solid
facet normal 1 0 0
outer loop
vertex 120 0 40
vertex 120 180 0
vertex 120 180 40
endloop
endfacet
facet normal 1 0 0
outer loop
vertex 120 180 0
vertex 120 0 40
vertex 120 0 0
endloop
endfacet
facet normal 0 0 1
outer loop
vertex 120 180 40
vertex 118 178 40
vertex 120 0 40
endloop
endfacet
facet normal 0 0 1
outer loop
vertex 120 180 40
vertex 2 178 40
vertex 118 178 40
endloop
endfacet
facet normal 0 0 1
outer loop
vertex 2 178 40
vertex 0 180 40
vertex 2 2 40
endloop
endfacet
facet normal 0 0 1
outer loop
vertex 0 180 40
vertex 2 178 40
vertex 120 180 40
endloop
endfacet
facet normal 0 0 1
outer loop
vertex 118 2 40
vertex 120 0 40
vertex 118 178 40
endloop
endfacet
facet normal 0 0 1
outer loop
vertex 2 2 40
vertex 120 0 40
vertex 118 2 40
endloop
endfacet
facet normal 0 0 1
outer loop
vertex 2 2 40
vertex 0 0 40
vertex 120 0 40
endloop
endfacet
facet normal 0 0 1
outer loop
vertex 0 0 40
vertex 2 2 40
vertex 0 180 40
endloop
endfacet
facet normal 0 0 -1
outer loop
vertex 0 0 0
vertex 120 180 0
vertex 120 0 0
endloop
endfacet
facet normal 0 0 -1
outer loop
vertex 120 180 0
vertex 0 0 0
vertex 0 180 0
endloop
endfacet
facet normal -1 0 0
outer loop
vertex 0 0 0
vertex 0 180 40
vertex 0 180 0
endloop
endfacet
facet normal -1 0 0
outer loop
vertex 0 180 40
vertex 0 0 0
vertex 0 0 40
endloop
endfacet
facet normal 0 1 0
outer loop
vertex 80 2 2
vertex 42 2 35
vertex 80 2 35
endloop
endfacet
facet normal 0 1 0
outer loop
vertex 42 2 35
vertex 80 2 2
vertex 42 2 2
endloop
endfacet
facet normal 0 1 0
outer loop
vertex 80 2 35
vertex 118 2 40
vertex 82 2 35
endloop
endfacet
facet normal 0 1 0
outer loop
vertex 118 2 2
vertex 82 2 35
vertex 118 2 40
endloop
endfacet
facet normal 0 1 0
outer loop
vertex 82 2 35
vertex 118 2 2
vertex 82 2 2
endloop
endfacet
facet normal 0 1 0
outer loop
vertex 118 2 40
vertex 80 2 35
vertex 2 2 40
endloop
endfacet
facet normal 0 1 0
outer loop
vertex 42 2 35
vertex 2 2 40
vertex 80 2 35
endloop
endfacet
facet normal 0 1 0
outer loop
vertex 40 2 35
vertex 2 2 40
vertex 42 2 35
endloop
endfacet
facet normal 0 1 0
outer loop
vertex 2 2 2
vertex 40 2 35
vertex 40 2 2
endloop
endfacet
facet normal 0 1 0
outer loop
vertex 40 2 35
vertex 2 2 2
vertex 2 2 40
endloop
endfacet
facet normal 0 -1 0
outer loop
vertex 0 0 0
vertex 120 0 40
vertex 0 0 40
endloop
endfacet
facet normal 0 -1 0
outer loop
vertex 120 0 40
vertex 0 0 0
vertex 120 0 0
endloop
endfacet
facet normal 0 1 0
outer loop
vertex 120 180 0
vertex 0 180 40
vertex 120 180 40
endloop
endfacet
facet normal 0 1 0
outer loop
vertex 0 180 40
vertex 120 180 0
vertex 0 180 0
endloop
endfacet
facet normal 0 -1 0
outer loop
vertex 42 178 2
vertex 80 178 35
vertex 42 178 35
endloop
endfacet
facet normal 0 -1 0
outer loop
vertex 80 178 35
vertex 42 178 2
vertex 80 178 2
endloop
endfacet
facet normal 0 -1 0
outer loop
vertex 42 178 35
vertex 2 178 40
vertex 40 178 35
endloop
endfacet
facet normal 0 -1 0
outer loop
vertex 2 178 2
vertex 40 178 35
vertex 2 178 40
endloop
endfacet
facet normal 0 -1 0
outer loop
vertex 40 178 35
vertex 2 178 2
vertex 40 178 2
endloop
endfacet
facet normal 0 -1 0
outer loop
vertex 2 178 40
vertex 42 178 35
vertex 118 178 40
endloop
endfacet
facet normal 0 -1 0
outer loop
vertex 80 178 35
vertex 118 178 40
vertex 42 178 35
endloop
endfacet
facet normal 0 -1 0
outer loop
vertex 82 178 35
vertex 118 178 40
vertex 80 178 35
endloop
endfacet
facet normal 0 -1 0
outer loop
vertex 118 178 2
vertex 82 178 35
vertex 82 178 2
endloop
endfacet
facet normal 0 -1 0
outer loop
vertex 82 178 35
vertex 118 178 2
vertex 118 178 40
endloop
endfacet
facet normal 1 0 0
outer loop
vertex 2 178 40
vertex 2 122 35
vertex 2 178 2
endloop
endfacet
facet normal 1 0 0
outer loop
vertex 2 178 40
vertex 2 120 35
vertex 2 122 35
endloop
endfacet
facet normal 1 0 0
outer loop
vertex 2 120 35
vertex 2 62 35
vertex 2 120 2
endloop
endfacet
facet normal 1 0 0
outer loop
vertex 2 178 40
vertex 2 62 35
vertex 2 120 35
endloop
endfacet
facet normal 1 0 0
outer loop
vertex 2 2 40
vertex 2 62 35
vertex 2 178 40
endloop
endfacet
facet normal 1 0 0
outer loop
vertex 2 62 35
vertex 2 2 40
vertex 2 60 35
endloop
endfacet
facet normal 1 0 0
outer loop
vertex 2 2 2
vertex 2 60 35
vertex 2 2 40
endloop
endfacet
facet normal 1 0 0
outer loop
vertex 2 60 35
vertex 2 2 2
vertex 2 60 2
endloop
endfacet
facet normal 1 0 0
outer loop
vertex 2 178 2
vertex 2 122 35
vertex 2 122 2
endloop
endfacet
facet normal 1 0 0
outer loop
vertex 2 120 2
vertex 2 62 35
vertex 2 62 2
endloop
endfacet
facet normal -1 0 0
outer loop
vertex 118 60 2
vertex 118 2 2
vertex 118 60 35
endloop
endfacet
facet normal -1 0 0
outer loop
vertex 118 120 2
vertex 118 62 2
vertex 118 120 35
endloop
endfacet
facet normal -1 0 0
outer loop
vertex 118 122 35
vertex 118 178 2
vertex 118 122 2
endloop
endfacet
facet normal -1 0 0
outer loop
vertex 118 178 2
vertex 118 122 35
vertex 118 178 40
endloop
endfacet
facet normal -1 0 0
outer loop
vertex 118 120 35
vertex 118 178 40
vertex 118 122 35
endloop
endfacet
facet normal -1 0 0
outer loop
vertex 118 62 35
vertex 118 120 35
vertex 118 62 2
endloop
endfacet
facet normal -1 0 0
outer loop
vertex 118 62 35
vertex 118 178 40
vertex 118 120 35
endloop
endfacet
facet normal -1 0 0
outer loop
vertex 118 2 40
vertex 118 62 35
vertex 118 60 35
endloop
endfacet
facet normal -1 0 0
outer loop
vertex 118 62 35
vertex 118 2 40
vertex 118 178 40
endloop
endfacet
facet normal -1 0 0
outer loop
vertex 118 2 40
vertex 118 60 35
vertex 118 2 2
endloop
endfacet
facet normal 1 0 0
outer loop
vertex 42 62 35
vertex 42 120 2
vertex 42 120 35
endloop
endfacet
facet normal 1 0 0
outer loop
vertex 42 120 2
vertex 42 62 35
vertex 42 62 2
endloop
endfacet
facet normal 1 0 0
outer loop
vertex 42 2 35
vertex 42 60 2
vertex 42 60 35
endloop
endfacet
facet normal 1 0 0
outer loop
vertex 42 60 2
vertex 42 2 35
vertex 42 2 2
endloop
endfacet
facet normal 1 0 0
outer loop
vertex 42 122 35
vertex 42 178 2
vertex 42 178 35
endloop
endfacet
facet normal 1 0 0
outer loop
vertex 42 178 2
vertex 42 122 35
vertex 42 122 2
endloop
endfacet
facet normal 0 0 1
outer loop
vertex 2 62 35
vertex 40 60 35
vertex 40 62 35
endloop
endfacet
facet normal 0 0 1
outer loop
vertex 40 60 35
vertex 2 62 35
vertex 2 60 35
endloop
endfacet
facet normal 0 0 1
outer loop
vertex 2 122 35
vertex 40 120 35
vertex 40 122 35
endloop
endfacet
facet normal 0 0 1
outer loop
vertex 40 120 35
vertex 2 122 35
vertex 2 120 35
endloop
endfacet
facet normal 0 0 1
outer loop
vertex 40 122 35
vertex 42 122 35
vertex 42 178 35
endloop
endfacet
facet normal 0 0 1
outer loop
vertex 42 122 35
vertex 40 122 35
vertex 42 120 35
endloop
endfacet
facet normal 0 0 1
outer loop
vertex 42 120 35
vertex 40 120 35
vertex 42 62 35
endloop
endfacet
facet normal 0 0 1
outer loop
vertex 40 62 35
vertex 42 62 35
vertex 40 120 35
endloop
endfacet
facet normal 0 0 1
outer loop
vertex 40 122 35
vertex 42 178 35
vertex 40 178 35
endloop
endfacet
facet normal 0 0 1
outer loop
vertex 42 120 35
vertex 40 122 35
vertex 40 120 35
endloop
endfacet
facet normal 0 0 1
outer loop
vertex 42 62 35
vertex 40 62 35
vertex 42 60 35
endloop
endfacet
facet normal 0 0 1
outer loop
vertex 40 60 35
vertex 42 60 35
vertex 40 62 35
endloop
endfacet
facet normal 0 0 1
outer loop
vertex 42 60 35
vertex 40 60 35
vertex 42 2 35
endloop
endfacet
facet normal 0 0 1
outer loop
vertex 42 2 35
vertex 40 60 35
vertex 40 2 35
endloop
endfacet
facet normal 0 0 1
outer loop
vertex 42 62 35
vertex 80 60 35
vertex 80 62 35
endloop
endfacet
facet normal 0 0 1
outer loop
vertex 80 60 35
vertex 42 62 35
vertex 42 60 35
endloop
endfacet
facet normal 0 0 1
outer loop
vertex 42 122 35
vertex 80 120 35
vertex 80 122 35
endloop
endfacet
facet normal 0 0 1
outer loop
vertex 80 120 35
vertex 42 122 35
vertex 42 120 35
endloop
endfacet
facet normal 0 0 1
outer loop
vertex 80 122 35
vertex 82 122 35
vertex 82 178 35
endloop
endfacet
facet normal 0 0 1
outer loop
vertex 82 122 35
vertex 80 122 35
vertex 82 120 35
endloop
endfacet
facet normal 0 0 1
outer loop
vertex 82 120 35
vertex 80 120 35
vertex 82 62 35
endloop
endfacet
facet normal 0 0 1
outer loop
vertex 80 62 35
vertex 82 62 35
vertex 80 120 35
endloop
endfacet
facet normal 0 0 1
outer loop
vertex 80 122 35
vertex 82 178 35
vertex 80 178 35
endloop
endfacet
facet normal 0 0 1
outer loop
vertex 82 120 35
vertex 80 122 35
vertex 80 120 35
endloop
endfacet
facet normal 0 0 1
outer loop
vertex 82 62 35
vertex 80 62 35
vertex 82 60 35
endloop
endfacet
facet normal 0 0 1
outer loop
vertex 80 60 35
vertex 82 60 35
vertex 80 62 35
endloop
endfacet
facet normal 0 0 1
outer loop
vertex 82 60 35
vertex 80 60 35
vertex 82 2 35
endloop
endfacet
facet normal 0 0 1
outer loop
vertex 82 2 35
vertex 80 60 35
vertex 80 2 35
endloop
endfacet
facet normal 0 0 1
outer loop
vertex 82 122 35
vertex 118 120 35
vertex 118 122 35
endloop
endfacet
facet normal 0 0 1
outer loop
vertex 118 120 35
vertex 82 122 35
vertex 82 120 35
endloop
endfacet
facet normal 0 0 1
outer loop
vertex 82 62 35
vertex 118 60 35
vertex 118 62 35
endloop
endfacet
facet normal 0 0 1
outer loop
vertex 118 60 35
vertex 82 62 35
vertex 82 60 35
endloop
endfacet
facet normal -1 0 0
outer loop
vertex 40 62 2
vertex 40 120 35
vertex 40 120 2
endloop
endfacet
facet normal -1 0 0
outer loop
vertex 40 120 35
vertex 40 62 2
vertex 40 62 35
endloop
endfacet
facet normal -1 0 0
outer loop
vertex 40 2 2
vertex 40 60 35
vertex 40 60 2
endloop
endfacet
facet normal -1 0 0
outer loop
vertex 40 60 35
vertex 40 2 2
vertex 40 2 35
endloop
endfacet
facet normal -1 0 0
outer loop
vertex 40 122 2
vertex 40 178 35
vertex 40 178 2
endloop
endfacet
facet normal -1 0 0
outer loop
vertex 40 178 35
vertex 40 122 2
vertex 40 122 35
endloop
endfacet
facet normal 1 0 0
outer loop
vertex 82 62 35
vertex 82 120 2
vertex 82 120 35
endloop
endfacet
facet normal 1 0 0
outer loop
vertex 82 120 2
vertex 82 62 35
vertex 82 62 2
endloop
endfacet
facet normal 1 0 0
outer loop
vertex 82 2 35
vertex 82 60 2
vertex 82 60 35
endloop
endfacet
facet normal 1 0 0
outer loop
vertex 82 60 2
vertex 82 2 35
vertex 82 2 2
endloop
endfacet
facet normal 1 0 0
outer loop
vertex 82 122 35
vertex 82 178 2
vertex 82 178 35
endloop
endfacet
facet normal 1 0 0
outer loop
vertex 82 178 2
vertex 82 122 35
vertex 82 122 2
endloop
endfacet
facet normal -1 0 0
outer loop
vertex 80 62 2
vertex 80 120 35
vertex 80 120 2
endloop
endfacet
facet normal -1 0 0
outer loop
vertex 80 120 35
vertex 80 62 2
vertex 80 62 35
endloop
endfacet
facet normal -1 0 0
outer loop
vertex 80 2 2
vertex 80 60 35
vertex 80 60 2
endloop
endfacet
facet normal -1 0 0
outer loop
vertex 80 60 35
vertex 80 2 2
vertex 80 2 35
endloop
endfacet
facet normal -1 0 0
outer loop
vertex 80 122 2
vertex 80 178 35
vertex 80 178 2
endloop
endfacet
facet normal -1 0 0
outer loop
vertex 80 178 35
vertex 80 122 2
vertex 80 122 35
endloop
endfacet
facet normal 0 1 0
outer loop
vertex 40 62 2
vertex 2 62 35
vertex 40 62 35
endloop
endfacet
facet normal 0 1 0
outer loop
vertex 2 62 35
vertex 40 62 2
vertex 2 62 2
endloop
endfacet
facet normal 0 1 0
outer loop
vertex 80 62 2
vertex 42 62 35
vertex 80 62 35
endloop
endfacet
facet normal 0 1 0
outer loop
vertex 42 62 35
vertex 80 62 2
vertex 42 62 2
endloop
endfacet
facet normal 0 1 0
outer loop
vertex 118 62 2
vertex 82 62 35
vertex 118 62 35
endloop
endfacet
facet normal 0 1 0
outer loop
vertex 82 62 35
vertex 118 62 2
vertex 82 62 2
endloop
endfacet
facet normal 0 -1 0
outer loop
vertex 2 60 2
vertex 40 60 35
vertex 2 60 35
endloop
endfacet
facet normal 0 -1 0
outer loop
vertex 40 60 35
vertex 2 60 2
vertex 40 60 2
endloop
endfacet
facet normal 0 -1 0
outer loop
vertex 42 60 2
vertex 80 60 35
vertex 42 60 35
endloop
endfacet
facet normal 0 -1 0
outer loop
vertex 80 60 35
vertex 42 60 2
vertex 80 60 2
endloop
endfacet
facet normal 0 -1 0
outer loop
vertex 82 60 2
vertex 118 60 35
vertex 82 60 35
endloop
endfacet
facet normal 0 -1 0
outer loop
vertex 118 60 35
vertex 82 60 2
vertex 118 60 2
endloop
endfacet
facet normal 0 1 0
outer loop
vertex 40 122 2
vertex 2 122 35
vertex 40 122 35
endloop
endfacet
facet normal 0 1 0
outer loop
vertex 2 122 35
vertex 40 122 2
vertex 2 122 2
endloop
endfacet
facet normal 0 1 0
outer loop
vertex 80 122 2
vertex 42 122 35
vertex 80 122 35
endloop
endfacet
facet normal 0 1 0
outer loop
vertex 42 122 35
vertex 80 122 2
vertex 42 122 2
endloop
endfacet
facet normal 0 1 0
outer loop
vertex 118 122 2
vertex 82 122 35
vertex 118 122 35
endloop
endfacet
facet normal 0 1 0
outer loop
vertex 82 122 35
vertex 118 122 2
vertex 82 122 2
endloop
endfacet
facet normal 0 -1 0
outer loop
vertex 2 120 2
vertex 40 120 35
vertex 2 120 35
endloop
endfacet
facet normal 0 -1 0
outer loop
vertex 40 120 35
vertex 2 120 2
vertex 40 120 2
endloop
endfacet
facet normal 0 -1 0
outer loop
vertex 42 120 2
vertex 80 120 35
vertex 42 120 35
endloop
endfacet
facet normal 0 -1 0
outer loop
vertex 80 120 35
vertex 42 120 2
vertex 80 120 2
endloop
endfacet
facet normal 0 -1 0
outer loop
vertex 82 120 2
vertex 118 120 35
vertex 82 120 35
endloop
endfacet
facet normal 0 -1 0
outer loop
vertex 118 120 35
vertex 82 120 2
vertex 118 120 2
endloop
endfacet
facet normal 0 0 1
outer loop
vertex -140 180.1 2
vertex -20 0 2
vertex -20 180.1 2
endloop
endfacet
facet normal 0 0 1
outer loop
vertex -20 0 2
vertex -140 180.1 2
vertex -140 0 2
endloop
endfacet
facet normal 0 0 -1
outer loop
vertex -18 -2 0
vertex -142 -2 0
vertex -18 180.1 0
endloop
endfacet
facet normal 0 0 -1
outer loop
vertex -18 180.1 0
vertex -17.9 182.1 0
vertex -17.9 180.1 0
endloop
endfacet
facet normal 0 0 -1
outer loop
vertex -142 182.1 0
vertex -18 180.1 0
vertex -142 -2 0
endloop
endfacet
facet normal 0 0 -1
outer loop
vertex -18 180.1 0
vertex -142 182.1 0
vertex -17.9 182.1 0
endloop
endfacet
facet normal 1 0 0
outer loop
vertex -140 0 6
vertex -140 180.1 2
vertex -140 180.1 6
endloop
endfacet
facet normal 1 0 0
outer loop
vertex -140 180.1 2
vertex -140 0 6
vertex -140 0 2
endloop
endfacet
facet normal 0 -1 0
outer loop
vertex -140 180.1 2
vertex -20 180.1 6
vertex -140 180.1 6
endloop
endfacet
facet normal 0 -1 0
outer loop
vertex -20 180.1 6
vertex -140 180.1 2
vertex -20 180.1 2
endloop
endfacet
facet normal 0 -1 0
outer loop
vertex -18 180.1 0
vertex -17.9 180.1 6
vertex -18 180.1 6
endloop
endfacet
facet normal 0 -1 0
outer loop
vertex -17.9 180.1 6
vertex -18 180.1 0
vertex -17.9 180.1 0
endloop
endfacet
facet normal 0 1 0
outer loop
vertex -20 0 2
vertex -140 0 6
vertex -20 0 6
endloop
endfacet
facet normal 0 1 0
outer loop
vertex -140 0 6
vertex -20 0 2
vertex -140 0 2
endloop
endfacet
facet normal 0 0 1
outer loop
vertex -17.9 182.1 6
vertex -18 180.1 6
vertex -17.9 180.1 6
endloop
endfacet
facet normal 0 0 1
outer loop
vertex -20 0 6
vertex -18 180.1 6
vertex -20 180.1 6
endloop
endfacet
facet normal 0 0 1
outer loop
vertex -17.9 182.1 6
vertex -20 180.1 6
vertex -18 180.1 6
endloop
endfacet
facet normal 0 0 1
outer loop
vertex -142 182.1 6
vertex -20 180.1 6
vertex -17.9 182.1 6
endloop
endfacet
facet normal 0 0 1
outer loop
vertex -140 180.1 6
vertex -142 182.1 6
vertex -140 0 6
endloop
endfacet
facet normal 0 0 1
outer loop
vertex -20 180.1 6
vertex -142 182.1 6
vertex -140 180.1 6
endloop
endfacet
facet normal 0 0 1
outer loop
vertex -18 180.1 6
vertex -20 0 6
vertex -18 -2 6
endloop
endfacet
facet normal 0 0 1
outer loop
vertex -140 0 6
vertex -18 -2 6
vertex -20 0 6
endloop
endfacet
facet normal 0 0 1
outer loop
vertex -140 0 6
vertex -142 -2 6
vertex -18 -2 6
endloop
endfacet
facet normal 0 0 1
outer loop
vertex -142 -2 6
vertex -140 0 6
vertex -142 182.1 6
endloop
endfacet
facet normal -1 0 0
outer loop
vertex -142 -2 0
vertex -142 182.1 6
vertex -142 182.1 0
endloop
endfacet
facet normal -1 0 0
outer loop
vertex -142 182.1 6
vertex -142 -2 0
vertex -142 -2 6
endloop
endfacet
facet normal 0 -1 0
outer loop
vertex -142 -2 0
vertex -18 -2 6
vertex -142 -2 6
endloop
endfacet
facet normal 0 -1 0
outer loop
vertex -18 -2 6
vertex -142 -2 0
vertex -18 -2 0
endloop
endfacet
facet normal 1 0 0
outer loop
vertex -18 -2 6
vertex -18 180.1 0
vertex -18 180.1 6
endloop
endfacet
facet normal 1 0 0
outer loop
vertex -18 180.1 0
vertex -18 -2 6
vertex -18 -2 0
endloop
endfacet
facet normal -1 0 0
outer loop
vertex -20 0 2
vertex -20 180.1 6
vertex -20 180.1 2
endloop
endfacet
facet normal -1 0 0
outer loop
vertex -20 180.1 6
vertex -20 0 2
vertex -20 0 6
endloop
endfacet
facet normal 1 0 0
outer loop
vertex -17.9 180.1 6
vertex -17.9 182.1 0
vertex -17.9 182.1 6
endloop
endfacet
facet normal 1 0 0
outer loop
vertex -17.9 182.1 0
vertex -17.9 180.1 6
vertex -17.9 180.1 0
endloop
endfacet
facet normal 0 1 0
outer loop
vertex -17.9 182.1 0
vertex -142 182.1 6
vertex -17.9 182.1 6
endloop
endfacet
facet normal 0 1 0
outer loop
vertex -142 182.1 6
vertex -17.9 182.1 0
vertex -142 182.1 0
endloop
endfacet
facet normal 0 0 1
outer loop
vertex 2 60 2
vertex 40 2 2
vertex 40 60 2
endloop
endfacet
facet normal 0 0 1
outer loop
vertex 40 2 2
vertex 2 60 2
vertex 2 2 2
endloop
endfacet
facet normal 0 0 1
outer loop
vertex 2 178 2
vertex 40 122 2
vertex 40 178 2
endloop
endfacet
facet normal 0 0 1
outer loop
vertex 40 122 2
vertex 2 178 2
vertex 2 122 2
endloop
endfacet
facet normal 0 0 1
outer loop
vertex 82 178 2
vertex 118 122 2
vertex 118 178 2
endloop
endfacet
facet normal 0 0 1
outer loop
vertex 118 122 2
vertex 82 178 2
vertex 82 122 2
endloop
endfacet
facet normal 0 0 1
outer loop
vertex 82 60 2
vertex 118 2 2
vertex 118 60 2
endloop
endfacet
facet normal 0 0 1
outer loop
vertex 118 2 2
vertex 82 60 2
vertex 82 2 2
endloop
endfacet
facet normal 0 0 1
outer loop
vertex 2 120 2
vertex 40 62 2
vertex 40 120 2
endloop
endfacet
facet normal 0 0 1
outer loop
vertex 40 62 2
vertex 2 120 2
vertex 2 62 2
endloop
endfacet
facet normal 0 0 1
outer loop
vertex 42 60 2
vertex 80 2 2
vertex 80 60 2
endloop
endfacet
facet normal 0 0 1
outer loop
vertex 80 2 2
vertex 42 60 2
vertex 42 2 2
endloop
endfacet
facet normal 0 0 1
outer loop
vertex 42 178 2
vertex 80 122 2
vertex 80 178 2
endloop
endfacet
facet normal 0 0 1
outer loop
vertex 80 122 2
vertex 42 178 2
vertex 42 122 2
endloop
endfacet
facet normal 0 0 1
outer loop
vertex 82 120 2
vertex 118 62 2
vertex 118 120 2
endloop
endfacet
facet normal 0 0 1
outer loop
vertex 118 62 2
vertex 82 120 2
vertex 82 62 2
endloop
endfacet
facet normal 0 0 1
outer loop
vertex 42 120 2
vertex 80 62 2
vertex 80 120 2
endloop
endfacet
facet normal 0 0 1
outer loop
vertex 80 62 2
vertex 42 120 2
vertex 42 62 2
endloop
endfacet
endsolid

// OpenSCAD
// Run with default values: $ openscad pudelko.scad
// Run with configured params: $ openscad PARAMS pudelko.scad
// Params:
// -D size_x=VAL - horizontal size in mm (default: 120, min: 10, max: 250)
// -D size_y=VAL - vertical size in mm (default: 180, min: 10, max: 250)
// -D wall_thickness=VAL - walls thickness in mm (default: 2, min: 1, max: 5)
// -D border_wall_height=VAL height of bordering walls in mm (default: 40, min: 5, max: 100)
// -D divider_wall_height=VAL height of divider walls in mm (default: 35, min: border_wall_height, max: 100)
// -D compartments_vertical=VAL number of vertical dividers (default: 3, min: 0, max: (size_x / compartments_vertical) > wall_thickness + 2)
// -D compartments_horizontal=VAL number of horizontal dividers (default: 3, min: 0, max: (size_y / compartments_horizontal) > wall_thickness + 2)
// -D lid_fitment=VAL tolerance for the lid fitment in mm, default is tight fit (default: 0.1, min: 0.1, max 0.2)
// -D lid_sides=VAL length of lid sides in mm (default: 6, min: 2, max: 10)

module base(sizeX, sizeY, wallThickness) {
    cube([sizeX, sizeY, wallThickness]);
}

module borderWalls(sizeX, sizeY, wallHeight, wallThickness) {
    // Vertical
    cube([sizeX, wallThickness, wallHeight]);
    translate([0, sizeY - wallThickness, 0]) cube([sizeX, wallThickness, wallHeight]);
    
    // Horizontal
    cube([wallThickness, sizeY, wallHeight]);
    translate([sizeX - wallThickness, 0, 0]) cube([wallThickness, sizeY, wallHeight]);
}

module dividerWalls(sizeX, sizeY, wallThickness, dividerWallHeight, compsHor, compsVer) {
    // Vertical
    if (compsVer > 1) {
        spacingVer = sizeX / compsVer;
        for(i = [1 : compsVer - 1]) {
            translate([spacingVer * i, 0, 0]) cube([wallThickness, sizeY, dividerWallHeight]);
        }
    }
    
    // Horizontal
    if (compsHor > 1) {
        spacingHor = sizeY / compsHor;
        for(i = [1 : compsHor - 1]) {
            translate([0, spacingHor * i, 0]) cube([sizeX, wallThickness, dividerWallHeight]);
        }
    }
}

module lid(sizeX, sizeY, wallThickness, wallHeight, fitment, lidSides) {
    // Translate the position of the whole lid to be next to the box
    translate([-sizeX - 20, 0, 0]) {
        // Lid
        cube([sizeX + fitment, sizeY + fitment, wallThickness]);
        
        // Sides
        
        // West
        translate([-wallThickness, -wallThickness, 0]) cube([sizeX + wallThickness + fitment, wallThickness, lidSides]);
        
        // South
        translate([sizeX, -wallThickness, 0]) cube([wallThickness, sizeY + wallThickness + fitment, lidSides]);
       
        // East
        translate([0, sizeY + fitment, 0]) cube([sizeX + wallThickness + fitment, wallThickness, lidSides]);
        
        // North
        translate([-wallThickness, 0, 0]) cube([wallThickness, sizeY + wallThickness + fitment, lidSides]);
    }
}



$fn = 50;

// User configurable parameters
size_x = 120;
size_y = 180;
wall_thickness = 2;
border_wall_height = 40;
divider_wall_height = 35;
compartments_vertical = 3;
compartments_horizontal = 3;
lid_fitment = 0.1;
lid_sides = 6;

// Assigning user modified params or defaults to constants
SIZE_X = size_x != 120 && size_x <= 250 && size_x >= 10 ? size_x : 120;
SIZE_Y = size_y != 180 && size_y <= 250 && size_y >= 10 ? size_y : 180;
WALL_THICKNESS = wall_thickness != 2 && wall_thickness <= 5 && wall_thickness >= 1 ? wall_thickness : 2;
BORDER_WALL_HEIGHT = border_wall_height != 40 && border_wall_height <= 100 && border_wall_height >= 5 ? border_wall_height : 40;
DIVIDER_WALL_HEIGHT = divider_wall_height != 35 && divider_wall_height <= BORDER_WALL_HEIGHT && divider_wall_height >= 5 ? divider_wall_height : 35;
COMPART_VER = compartments_vertical != 3 && (SIZE_X / compartments_vertical) > WALL_THICKNESS + 2 ? compartments_vertical : 3;
COMPART_HOR = compartments_horizontal != 3 && (SIZE_Y / compartments_horizontal) > WALL_THICKNESS + 2 ? compartments_horizontal : 3;
LID_FITMENT = lid_fitment != 0.1 && lid_fitment >= 0.1 && lid_fitment <= 0.2 ? lid_fitment : 0.1;
LID_SIDES = lid_sides != 6 && lid_sides >= 2 && lid_sides <= 10 ? lid_sides : 6;

// Building the box
base(SIZE_X, SIZE_Y, WALL_THICKNESS);
borderWalls(SIZE_X, SIZE_Y, BORDER_WALL_HEIGHT, WALL_THICKNESS);
dividerWalls(SIZE_X, SIZE_Y, WALL_THICKNESS, DIVIDER_WALL_HEIGHT, COMPART_HOR, COMPART_VER);
lid(SIZE_X, SIZE_Y, WALL_THICKNESS, BORDER_WALL_HEIGHT, LID_FITMENT, LID_SIDES);
